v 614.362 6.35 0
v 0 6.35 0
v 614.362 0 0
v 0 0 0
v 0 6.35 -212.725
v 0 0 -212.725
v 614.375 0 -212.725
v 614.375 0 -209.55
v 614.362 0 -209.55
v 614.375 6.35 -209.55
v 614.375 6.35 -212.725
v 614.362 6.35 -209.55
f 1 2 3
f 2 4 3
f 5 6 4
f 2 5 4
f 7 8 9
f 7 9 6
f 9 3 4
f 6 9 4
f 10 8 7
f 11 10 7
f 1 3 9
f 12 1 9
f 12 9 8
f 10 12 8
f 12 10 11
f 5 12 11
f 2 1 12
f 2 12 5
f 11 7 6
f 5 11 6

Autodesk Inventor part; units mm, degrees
ref_plane "YZ Plane" through (0, 0, 0) normal (1, 0, 0) x (0, 1, 0)
ref_plane "XZ Plane" through (0, 0, 0) normal (0, 1, 0) x (-1, 0, 0)
ref_plane "XY Plane" through (0, 0, 0) normal (0, 0, 1) x (1, 0, 0)
sketch "Sketch1" plane through (0, 0, 0) normal (0, 1, 0) x (-1, 0, 0)
  line L0 (0, 0) -> (-614.3625, 0)
  line L1 (-614.3625, 0) -> (-614.3625, -209.55)
  line L2 (-614.3625, -209.55) -> (0, -209.55)
  line L3 (0, -209.55) -> (0, 0)
  dimension "d0" = 614.3625
  dimension "d1" = 209.55
extrude "Extrusion1" add sketch "Sketch1" along normal blind 6.35
sketch "Sketch2" plane through (0, 0, 0) normal (0, 1, 0) x (-1, 0, 0)
  line L0 (0, -209.55) -> (0, 0) projected
  line L1 (0, -209.55) -> (-614.3752, -209.55)
  line L2 (-614.3752, -209.55) -> (-614.3752, -212.725)
  line L3 (-614.3752, -212.725) -> (0, -212.725)
  line L4 (0, -212.725) -> (0, -209.55)
  dimension "d4" = 614.3752
  dimension "d5" = 3.175
extrude "Extrusion2" add sketch "Sketch2" along normal blind 6.35
sketch "Sketch3" plane through (0, 6.35, 0) normal (0, 1, 0) x (1, 0, 0)
  point P0 (0, 0)
properties part number "TopOfTheTopOfTheJukebox_Ocampo"
